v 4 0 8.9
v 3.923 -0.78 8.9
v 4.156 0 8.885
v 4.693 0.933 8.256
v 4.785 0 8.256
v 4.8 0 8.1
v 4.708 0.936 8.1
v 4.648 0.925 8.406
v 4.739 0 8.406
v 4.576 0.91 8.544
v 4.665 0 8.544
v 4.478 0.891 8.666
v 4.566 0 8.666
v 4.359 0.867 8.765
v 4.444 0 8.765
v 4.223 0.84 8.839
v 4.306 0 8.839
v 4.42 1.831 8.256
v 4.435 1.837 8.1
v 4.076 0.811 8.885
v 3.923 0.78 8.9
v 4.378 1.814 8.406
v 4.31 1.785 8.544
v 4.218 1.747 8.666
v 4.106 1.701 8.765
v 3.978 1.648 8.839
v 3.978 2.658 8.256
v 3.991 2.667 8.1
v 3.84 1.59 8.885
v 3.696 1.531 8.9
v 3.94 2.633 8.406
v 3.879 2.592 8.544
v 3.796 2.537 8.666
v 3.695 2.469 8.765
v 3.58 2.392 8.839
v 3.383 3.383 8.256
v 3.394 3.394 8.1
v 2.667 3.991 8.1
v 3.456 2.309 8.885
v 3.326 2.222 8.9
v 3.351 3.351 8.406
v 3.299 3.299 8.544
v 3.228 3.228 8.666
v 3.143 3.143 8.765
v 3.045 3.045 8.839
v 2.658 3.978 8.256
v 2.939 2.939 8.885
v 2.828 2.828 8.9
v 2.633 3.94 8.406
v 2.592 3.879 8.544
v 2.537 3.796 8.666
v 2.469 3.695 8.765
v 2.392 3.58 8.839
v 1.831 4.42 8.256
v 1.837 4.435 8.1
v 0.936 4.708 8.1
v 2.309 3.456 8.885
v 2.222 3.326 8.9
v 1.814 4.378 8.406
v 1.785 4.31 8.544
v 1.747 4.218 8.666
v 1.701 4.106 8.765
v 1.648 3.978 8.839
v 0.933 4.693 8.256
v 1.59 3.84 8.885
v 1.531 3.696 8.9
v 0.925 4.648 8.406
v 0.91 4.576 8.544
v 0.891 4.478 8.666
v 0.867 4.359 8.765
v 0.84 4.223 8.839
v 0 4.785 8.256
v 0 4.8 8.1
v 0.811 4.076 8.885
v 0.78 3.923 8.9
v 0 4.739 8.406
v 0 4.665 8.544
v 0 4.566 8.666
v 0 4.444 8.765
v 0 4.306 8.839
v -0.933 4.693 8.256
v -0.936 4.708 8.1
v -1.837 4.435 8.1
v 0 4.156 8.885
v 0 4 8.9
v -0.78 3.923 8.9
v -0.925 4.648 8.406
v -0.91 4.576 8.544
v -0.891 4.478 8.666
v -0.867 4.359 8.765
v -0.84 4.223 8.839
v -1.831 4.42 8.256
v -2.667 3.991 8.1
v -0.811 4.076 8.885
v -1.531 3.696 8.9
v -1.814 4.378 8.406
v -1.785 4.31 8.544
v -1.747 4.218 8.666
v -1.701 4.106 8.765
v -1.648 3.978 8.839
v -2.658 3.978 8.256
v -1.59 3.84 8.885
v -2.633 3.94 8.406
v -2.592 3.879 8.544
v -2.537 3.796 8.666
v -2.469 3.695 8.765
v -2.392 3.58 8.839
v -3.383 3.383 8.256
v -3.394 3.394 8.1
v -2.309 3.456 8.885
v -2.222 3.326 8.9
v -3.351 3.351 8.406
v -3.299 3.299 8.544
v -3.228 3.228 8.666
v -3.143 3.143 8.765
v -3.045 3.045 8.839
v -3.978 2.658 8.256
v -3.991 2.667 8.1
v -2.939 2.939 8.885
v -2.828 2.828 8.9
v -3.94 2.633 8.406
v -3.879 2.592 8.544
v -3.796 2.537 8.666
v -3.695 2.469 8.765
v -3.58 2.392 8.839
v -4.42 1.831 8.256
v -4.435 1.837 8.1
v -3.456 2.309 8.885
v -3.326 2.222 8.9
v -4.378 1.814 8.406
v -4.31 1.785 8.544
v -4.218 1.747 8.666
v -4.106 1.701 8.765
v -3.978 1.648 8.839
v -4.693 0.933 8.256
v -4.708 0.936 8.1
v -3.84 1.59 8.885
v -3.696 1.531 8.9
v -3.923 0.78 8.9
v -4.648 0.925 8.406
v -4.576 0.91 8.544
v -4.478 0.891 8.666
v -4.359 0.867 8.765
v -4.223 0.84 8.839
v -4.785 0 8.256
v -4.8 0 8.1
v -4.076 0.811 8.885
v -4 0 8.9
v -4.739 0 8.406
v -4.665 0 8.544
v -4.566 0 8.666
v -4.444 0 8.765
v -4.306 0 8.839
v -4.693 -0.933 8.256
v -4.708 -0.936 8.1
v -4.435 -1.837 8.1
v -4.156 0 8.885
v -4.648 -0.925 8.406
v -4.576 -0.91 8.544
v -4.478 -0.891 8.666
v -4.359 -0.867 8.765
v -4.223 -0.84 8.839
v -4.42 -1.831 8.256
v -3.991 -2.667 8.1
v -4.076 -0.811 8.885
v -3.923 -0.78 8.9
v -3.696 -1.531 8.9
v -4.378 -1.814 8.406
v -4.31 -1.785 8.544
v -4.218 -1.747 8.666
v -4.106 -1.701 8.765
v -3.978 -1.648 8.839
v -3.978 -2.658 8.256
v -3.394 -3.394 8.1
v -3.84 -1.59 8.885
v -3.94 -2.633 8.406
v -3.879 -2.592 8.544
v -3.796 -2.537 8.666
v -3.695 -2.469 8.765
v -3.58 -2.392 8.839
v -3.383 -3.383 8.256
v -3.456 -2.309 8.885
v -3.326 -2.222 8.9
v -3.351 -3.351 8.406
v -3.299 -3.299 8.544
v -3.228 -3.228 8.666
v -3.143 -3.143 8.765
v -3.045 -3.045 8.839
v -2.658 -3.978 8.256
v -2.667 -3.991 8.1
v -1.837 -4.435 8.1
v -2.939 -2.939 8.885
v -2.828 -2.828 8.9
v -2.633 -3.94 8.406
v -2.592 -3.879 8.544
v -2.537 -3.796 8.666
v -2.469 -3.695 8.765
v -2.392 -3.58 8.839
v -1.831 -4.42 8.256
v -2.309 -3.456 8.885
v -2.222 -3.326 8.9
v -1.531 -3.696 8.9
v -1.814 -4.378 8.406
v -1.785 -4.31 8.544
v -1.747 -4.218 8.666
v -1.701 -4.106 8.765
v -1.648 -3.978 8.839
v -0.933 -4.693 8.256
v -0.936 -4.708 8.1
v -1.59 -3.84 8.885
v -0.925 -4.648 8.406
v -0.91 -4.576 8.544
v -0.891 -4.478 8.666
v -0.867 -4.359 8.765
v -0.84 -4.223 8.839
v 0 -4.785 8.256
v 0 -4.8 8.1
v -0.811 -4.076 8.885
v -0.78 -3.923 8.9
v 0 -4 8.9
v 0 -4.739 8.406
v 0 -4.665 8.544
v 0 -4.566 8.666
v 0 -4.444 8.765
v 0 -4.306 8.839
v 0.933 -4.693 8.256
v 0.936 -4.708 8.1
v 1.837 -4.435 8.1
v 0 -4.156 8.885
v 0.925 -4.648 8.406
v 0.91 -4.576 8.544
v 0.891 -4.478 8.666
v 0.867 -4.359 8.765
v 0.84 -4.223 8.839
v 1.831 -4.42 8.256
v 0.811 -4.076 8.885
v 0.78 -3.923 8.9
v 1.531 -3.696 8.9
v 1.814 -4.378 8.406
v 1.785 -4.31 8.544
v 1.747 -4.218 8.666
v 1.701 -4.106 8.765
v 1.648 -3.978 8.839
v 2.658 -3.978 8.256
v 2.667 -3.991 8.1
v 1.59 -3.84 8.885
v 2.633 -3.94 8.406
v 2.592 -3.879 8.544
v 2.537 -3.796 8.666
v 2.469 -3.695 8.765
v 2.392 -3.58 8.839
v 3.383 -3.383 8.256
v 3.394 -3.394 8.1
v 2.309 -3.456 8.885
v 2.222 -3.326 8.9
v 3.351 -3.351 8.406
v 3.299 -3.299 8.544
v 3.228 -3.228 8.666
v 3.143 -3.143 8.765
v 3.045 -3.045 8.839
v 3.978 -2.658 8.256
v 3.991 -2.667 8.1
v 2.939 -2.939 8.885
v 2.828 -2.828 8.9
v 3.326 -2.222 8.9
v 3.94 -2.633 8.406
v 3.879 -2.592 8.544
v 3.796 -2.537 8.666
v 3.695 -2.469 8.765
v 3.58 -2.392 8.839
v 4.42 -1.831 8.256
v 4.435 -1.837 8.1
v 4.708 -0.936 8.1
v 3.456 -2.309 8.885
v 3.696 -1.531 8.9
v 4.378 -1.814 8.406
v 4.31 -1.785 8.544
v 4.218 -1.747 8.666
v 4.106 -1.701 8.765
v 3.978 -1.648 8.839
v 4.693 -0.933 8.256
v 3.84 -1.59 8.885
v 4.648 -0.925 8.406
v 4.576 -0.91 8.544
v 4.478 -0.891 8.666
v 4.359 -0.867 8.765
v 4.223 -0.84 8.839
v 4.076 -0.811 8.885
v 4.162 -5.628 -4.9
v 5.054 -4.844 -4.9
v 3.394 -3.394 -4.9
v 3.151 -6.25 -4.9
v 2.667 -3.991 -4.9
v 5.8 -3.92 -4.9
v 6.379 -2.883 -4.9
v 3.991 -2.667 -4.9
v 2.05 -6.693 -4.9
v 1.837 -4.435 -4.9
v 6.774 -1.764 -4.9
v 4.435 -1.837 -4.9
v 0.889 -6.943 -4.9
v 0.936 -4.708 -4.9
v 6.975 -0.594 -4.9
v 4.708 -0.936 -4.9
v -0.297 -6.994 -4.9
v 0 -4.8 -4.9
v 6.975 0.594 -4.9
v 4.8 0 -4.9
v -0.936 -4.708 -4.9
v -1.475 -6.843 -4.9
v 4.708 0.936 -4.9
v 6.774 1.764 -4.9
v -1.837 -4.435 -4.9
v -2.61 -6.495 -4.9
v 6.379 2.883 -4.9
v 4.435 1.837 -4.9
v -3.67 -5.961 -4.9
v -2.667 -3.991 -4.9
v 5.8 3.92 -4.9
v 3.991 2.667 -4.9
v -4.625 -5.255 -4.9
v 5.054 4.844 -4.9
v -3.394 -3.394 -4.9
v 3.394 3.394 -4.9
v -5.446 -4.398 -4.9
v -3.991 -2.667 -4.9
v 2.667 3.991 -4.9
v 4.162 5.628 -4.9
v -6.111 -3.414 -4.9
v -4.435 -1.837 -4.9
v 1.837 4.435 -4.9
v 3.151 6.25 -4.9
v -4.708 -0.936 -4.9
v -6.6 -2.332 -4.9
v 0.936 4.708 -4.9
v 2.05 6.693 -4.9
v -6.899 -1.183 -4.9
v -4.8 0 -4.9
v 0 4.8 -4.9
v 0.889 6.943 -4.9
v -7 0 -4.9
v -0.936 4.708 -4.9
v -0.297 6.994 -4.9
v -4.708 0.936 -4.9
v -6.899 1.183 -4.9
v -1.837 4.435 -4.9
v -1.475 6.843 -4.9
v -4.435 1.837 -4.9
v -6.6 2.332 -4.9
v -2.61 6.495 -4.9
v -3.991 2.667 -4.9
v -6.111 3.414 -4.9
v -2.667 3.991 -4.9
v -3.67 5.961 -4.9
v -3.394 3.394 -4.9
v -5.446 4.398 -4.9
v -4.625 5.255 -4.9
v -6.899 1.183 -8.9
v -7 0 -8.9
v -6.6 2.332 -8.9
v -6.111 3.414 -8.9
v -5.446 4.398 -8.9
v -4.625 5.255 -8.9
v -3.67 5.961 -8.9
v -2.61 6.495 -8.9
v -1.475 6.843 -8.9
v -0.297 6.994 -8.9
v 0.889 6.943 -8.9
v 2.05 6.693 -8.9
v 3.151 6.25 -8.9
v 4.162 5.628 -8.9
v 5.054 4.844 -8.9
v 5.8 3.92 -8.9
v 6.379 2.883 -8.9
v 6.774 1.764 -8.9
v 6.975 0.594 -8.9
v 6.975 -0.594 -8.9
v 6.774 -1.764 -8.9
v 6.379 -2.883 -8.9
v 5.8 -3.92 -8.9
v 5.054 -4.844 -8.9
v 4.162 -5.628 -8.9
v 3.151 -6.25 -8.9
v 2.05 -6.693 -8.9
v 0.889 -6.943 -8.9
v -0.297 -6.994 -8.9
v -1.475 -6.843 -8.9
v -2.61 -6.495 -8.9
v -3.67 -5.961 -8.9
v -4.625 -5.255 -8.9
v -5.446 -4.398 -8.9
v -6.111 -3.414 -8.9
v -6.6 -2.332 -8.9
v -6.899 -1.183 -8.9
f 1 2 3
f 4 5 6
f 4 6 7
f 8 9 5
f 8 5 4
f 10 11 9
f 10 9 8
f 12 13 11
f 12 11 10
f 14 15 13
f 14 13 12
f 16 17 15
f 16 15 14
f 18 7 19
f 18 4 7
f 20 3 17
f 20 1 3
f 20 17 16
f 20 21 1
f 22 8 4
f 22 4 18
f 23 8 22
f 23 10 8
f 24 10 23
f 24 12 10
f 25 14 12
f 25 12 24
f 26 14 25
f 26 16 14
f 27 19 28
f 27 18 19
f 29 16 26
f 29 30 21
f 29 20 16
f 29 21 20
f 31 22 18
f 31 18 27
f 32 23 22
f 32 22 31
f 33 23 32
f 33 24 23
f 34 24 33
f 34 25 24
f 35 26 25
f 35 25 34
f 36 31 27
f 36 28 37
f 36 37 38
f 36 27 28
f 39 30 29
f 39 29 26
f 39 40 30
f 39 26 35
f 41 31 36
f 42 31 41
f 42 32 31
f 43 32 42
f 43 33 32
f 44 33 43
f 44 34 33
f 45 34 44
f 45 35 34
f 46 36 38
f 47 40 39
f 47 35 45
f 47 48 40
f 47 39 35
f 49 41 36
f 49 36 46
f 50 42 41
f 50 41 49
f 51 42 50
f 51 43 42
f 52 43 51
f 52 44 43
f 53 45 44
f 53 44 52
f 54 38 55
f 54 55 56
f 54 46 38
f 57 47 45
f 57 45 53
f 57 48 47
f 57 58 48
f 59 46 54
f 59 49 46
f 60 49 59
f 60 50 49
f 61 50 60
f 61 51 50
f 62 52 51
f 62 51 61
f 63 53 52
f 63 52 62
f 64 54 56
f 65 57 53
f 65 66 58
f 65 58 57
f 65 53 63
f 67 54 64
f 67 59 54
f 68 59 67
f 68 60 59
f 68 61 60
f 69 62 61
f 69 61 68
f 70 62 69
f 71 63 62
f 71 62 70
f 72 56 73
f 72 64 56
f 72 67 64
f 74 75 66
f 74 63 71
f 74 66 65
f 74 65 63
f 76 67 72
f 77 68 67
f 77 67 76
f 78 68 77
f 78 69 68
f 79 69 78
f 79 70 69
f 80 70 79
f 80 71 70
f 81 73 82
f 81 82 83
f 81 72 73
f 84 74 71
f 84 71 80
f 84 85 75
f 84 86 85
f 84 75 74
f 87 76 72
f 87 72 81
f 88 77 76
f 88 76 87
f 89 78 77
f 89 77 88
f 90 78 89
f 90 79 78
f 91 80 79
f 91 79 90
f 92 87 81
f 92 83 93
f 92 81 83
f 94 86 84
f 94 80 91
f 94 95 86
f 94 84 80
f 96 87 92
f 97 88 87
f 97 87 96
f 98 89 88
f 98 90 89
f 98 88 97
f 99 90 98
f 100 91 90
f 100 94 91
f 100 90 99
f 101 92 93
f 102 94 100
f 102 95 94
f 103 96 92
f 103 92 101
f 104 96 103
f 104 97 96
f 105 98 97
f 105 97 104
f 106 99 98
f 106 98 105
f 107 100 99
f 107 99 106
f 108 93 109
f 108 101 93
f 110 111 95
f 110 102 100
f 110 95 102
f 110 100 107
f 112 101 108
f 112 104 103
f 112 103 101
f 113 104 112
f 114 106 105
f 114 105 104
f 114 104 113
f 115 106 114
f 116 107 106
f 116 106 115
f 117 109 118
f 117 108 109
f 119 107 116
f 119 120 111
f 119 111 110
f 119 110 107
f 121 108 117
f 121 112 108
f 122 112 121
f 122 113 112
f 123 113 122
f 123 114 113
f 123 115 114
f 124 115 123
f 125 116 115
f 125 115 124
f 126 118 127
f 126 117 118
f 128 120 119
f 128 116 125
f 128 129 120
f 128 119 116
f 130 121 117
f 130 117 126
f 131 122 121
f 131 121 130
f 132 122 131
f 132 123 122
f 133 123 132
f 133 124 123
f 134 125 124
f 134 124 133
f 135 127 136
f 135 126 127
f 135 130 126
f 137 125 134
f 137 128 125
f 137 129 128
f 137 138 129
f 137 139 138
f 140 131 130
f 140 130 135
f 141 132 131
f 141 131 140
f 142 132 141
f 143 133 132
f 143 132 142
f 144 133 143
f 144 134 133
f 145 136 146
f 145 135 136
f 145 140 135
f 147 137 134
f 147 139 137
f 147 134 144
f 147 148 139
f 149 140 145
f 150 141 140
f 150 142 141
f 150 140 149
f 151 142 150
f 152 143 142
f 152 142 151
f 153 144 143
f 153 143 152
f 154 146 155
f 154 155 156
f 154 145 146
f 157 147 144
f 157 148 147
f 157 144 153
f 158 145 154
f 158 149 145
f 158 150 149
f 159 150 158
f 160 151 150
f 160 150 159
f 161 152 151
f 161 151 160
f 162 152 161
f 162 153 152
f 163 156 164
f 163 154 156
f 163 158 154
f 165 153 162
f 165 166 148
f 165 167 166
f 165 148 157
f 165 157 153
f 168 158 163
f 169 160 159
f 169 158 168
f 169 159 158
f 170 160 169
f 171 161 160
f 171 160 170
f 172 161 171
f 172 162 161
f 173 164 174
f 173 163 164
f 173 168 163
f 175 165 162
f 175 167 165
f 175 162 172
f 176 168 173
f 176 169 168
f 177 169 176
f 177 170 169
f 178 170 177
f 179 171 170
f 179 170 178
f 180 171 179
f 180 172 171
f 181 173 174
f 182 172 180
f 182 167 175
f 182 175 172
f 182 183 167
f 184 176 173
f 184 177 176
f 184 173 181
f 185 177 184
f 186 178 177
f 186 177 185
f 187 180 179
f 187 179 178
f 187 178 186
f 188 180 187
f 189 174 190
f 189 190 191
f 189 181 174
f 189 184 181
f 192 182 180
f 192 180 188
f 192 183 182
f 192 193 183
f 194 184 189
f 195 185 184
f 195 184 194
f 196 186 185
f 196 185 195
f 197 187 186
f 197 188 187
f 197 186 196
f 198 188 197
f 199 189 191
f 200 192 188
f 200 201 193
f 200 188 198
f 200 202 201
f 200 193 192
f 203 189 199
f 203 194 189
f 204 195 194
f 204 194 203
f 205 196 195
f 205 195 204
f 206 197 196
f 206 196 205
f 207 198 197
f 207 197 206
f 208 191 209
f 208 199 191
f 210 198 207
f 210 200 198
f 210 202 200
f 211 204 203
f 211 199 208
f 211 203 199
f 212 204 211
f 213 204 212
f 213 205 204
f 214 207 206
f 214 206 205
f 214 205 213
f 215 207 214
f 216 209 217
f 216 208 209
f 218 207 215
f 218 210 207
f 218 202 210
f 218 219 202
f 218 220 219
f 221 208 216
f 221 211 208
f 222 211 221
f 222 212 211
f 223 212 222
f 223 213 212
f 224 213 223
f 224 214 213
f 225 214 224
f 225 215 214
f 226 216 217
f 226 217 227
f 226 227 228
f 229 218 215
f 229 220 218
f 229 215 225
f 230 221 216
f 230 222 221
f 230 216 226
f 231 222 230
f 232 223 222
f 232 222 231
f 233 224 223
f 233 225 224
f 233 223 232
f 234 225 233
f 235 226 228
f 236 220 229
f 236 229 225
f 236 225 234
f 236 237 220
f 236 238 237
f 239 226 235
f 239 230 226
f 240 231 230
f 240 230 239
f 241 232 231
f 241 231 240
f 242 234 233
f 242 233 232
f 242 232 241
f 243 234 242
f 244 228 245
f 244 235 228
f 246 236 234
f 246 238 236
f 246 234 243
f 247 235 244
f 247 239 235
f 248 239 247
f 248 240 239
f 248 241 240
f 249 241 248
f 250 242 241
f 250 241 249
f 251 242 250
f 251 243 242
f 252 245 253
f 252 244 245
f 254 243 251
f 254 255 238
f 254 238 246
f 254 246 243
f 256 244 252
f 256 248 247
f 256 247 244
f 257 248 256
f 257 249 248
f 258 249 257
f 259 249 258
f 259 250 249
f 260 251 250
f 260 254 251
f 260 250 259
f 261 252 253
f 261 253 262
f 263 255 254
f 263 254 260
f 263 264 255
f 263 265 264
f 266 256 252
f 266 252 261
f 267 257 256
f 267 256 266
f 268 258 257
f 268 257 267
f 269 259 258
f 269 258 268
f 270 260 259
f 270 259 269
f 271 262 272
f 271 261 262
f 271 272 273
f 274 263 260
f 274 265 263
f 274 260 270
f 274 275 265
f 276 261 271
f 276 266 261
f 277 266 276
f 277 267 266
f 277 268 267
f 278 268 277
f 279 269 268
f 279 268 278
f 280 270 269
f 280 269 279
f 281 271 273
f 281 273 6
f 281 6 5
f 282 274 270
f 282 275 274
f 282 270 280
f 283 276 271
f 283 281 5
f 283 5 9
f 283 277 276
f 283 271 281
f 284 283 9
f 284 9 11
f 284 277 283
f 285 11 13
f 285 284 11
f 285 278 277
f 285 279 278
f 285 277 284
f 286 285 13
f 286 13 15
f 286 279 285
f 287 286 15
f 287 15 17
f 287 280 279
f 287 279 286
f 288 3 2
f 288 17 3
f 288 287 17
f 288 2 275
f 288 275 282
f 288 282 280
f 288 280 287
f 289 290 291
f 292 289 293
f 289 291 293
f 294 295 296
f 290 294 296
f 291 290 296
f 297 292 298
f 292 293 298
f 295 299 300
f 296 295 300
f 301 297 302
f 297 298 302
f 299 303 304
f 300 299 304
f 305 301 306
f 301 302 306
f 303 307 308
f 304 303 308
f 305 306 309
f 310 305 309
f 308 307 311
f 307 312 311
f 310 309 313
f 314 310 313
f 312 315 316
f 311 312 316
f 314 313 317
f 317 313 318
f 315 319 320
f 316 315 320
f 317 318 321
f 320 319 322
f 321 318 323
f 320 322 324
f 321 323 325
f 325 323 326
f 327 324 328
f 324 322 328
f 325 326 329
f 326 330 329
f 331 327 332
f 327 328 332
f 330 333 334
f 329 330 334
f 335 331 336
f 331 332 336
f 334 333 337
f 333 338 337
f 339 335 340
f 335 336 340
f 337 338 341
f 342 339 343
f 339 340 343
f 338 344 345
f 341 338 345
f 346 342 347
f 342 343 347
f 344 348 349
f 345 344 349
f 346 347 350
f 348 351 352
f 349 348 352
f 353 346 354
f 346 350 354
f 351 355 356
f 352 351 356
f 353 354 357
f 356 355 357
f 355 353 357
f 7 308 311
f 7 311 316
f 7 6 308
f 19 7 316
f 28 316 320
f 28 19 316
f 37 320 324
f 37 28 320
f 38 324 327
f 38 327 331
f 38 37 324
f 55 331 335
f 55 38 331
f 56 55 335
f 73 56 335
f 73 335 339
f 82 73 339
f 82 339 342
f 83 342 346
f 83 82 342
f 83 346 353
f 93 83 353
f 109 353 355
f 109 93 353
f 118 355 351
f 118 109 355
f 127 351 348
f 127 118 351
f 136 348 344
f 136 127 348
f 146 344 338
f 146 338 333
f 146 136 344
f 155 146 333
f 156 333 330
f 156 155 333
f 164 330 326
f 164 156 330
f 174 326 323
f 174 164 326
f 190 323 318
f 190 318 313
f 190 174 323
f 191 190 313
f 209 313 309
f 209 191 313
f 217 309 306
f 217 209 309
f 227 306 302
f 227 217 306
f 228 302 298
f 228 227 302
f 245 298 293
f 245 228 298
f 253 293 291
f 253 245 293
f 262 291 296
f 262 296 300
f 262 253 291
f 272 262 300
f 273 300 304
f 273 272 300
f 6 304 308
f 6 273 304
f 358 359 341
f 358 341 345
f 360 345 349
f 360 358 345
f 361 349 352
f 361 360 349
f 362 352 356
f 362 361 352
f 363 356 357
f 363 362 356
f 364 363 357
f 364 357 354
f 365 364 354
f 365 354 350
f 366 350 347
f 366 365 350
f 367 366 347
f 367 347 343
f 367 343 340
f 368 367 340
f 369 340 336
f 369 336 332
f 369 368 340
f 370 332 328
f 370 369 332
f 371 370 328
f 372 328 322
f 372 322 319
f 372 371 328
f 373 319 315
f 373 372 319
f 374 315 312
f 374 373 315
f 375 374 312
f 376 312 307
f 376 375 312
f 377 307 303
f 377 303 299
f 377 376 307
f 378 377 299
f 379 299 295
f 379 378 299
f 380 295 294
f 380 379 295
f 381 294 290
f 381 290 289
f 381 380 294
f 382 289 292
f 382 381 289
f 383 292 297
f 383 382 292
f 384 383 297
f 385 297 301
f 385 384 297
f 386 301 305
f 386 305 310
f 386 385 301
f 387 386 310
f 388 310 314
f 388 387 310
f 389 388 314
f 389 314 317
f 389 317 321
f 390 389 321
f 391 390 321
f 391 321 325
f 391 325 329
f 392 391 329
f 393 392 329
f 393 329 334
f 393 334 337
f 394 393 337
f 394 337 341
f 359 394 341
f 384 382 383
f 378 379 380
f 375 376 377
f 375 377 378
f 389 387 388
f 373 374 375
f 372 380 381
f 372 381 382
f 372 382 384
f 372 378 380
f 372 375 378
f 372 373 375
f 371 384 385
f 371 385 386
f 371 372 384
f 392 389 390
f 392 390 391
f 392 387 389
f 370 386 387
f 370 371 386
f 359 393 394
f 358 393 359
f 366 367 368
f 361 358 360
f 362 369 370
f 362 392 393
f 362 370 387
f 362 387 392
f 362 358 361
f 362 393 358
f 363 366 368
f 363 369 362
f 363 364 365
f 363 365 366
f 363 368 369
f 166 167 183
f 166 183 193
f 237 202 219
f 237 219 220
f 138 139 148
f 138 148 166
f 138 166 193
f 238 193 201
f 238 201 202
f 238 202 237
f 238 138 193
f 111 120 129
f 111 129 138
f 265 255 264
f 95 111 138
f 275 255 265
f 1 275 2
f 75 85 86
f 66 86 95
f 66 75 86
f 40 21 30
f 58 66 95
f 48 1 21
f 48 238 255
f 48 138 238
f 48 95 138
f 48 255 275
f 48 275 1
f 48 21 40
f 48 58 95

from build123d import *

# Parameters (mm, degrees)
SKETCH1_R           = 4.8
BOSS_EXTRUDE1_DEPTH = 8.9
FILLET1_R           = 0.8
SKETCH2_R           = 7
BOSS_EXTRUDE2_DEPTH = 4


with BuildPart() as part:
    # Sketch1 → Boss-Extrude1 (new body, symmetric)
    with BuildSketch(Plane.XY):
        Circle(SKETCH1_R)
    extrude(amount=BOSS_EXTRUDE1_DEPTH, both=True)

    # Fillet1
    fillet1_edges = [part.edges().sort_by_distance(p)[0] for p in [
        (-4.8, 0, 8.9),
    ]]
    fillet(fillet1_edges, radius=FILLET1_R)

    # Sketch2 → Boss-Extrude2 (add)
    with BuildSketch(Plane(origin=(0, 0, -8.9), x_dir=(-1, 0, 0), z_dir=(0, 0, -1))):
        Circle(SKETCH2_R)
    extrude(amount=-BOSS_EXTRUDE2_DEPTH)


solid = part.part
